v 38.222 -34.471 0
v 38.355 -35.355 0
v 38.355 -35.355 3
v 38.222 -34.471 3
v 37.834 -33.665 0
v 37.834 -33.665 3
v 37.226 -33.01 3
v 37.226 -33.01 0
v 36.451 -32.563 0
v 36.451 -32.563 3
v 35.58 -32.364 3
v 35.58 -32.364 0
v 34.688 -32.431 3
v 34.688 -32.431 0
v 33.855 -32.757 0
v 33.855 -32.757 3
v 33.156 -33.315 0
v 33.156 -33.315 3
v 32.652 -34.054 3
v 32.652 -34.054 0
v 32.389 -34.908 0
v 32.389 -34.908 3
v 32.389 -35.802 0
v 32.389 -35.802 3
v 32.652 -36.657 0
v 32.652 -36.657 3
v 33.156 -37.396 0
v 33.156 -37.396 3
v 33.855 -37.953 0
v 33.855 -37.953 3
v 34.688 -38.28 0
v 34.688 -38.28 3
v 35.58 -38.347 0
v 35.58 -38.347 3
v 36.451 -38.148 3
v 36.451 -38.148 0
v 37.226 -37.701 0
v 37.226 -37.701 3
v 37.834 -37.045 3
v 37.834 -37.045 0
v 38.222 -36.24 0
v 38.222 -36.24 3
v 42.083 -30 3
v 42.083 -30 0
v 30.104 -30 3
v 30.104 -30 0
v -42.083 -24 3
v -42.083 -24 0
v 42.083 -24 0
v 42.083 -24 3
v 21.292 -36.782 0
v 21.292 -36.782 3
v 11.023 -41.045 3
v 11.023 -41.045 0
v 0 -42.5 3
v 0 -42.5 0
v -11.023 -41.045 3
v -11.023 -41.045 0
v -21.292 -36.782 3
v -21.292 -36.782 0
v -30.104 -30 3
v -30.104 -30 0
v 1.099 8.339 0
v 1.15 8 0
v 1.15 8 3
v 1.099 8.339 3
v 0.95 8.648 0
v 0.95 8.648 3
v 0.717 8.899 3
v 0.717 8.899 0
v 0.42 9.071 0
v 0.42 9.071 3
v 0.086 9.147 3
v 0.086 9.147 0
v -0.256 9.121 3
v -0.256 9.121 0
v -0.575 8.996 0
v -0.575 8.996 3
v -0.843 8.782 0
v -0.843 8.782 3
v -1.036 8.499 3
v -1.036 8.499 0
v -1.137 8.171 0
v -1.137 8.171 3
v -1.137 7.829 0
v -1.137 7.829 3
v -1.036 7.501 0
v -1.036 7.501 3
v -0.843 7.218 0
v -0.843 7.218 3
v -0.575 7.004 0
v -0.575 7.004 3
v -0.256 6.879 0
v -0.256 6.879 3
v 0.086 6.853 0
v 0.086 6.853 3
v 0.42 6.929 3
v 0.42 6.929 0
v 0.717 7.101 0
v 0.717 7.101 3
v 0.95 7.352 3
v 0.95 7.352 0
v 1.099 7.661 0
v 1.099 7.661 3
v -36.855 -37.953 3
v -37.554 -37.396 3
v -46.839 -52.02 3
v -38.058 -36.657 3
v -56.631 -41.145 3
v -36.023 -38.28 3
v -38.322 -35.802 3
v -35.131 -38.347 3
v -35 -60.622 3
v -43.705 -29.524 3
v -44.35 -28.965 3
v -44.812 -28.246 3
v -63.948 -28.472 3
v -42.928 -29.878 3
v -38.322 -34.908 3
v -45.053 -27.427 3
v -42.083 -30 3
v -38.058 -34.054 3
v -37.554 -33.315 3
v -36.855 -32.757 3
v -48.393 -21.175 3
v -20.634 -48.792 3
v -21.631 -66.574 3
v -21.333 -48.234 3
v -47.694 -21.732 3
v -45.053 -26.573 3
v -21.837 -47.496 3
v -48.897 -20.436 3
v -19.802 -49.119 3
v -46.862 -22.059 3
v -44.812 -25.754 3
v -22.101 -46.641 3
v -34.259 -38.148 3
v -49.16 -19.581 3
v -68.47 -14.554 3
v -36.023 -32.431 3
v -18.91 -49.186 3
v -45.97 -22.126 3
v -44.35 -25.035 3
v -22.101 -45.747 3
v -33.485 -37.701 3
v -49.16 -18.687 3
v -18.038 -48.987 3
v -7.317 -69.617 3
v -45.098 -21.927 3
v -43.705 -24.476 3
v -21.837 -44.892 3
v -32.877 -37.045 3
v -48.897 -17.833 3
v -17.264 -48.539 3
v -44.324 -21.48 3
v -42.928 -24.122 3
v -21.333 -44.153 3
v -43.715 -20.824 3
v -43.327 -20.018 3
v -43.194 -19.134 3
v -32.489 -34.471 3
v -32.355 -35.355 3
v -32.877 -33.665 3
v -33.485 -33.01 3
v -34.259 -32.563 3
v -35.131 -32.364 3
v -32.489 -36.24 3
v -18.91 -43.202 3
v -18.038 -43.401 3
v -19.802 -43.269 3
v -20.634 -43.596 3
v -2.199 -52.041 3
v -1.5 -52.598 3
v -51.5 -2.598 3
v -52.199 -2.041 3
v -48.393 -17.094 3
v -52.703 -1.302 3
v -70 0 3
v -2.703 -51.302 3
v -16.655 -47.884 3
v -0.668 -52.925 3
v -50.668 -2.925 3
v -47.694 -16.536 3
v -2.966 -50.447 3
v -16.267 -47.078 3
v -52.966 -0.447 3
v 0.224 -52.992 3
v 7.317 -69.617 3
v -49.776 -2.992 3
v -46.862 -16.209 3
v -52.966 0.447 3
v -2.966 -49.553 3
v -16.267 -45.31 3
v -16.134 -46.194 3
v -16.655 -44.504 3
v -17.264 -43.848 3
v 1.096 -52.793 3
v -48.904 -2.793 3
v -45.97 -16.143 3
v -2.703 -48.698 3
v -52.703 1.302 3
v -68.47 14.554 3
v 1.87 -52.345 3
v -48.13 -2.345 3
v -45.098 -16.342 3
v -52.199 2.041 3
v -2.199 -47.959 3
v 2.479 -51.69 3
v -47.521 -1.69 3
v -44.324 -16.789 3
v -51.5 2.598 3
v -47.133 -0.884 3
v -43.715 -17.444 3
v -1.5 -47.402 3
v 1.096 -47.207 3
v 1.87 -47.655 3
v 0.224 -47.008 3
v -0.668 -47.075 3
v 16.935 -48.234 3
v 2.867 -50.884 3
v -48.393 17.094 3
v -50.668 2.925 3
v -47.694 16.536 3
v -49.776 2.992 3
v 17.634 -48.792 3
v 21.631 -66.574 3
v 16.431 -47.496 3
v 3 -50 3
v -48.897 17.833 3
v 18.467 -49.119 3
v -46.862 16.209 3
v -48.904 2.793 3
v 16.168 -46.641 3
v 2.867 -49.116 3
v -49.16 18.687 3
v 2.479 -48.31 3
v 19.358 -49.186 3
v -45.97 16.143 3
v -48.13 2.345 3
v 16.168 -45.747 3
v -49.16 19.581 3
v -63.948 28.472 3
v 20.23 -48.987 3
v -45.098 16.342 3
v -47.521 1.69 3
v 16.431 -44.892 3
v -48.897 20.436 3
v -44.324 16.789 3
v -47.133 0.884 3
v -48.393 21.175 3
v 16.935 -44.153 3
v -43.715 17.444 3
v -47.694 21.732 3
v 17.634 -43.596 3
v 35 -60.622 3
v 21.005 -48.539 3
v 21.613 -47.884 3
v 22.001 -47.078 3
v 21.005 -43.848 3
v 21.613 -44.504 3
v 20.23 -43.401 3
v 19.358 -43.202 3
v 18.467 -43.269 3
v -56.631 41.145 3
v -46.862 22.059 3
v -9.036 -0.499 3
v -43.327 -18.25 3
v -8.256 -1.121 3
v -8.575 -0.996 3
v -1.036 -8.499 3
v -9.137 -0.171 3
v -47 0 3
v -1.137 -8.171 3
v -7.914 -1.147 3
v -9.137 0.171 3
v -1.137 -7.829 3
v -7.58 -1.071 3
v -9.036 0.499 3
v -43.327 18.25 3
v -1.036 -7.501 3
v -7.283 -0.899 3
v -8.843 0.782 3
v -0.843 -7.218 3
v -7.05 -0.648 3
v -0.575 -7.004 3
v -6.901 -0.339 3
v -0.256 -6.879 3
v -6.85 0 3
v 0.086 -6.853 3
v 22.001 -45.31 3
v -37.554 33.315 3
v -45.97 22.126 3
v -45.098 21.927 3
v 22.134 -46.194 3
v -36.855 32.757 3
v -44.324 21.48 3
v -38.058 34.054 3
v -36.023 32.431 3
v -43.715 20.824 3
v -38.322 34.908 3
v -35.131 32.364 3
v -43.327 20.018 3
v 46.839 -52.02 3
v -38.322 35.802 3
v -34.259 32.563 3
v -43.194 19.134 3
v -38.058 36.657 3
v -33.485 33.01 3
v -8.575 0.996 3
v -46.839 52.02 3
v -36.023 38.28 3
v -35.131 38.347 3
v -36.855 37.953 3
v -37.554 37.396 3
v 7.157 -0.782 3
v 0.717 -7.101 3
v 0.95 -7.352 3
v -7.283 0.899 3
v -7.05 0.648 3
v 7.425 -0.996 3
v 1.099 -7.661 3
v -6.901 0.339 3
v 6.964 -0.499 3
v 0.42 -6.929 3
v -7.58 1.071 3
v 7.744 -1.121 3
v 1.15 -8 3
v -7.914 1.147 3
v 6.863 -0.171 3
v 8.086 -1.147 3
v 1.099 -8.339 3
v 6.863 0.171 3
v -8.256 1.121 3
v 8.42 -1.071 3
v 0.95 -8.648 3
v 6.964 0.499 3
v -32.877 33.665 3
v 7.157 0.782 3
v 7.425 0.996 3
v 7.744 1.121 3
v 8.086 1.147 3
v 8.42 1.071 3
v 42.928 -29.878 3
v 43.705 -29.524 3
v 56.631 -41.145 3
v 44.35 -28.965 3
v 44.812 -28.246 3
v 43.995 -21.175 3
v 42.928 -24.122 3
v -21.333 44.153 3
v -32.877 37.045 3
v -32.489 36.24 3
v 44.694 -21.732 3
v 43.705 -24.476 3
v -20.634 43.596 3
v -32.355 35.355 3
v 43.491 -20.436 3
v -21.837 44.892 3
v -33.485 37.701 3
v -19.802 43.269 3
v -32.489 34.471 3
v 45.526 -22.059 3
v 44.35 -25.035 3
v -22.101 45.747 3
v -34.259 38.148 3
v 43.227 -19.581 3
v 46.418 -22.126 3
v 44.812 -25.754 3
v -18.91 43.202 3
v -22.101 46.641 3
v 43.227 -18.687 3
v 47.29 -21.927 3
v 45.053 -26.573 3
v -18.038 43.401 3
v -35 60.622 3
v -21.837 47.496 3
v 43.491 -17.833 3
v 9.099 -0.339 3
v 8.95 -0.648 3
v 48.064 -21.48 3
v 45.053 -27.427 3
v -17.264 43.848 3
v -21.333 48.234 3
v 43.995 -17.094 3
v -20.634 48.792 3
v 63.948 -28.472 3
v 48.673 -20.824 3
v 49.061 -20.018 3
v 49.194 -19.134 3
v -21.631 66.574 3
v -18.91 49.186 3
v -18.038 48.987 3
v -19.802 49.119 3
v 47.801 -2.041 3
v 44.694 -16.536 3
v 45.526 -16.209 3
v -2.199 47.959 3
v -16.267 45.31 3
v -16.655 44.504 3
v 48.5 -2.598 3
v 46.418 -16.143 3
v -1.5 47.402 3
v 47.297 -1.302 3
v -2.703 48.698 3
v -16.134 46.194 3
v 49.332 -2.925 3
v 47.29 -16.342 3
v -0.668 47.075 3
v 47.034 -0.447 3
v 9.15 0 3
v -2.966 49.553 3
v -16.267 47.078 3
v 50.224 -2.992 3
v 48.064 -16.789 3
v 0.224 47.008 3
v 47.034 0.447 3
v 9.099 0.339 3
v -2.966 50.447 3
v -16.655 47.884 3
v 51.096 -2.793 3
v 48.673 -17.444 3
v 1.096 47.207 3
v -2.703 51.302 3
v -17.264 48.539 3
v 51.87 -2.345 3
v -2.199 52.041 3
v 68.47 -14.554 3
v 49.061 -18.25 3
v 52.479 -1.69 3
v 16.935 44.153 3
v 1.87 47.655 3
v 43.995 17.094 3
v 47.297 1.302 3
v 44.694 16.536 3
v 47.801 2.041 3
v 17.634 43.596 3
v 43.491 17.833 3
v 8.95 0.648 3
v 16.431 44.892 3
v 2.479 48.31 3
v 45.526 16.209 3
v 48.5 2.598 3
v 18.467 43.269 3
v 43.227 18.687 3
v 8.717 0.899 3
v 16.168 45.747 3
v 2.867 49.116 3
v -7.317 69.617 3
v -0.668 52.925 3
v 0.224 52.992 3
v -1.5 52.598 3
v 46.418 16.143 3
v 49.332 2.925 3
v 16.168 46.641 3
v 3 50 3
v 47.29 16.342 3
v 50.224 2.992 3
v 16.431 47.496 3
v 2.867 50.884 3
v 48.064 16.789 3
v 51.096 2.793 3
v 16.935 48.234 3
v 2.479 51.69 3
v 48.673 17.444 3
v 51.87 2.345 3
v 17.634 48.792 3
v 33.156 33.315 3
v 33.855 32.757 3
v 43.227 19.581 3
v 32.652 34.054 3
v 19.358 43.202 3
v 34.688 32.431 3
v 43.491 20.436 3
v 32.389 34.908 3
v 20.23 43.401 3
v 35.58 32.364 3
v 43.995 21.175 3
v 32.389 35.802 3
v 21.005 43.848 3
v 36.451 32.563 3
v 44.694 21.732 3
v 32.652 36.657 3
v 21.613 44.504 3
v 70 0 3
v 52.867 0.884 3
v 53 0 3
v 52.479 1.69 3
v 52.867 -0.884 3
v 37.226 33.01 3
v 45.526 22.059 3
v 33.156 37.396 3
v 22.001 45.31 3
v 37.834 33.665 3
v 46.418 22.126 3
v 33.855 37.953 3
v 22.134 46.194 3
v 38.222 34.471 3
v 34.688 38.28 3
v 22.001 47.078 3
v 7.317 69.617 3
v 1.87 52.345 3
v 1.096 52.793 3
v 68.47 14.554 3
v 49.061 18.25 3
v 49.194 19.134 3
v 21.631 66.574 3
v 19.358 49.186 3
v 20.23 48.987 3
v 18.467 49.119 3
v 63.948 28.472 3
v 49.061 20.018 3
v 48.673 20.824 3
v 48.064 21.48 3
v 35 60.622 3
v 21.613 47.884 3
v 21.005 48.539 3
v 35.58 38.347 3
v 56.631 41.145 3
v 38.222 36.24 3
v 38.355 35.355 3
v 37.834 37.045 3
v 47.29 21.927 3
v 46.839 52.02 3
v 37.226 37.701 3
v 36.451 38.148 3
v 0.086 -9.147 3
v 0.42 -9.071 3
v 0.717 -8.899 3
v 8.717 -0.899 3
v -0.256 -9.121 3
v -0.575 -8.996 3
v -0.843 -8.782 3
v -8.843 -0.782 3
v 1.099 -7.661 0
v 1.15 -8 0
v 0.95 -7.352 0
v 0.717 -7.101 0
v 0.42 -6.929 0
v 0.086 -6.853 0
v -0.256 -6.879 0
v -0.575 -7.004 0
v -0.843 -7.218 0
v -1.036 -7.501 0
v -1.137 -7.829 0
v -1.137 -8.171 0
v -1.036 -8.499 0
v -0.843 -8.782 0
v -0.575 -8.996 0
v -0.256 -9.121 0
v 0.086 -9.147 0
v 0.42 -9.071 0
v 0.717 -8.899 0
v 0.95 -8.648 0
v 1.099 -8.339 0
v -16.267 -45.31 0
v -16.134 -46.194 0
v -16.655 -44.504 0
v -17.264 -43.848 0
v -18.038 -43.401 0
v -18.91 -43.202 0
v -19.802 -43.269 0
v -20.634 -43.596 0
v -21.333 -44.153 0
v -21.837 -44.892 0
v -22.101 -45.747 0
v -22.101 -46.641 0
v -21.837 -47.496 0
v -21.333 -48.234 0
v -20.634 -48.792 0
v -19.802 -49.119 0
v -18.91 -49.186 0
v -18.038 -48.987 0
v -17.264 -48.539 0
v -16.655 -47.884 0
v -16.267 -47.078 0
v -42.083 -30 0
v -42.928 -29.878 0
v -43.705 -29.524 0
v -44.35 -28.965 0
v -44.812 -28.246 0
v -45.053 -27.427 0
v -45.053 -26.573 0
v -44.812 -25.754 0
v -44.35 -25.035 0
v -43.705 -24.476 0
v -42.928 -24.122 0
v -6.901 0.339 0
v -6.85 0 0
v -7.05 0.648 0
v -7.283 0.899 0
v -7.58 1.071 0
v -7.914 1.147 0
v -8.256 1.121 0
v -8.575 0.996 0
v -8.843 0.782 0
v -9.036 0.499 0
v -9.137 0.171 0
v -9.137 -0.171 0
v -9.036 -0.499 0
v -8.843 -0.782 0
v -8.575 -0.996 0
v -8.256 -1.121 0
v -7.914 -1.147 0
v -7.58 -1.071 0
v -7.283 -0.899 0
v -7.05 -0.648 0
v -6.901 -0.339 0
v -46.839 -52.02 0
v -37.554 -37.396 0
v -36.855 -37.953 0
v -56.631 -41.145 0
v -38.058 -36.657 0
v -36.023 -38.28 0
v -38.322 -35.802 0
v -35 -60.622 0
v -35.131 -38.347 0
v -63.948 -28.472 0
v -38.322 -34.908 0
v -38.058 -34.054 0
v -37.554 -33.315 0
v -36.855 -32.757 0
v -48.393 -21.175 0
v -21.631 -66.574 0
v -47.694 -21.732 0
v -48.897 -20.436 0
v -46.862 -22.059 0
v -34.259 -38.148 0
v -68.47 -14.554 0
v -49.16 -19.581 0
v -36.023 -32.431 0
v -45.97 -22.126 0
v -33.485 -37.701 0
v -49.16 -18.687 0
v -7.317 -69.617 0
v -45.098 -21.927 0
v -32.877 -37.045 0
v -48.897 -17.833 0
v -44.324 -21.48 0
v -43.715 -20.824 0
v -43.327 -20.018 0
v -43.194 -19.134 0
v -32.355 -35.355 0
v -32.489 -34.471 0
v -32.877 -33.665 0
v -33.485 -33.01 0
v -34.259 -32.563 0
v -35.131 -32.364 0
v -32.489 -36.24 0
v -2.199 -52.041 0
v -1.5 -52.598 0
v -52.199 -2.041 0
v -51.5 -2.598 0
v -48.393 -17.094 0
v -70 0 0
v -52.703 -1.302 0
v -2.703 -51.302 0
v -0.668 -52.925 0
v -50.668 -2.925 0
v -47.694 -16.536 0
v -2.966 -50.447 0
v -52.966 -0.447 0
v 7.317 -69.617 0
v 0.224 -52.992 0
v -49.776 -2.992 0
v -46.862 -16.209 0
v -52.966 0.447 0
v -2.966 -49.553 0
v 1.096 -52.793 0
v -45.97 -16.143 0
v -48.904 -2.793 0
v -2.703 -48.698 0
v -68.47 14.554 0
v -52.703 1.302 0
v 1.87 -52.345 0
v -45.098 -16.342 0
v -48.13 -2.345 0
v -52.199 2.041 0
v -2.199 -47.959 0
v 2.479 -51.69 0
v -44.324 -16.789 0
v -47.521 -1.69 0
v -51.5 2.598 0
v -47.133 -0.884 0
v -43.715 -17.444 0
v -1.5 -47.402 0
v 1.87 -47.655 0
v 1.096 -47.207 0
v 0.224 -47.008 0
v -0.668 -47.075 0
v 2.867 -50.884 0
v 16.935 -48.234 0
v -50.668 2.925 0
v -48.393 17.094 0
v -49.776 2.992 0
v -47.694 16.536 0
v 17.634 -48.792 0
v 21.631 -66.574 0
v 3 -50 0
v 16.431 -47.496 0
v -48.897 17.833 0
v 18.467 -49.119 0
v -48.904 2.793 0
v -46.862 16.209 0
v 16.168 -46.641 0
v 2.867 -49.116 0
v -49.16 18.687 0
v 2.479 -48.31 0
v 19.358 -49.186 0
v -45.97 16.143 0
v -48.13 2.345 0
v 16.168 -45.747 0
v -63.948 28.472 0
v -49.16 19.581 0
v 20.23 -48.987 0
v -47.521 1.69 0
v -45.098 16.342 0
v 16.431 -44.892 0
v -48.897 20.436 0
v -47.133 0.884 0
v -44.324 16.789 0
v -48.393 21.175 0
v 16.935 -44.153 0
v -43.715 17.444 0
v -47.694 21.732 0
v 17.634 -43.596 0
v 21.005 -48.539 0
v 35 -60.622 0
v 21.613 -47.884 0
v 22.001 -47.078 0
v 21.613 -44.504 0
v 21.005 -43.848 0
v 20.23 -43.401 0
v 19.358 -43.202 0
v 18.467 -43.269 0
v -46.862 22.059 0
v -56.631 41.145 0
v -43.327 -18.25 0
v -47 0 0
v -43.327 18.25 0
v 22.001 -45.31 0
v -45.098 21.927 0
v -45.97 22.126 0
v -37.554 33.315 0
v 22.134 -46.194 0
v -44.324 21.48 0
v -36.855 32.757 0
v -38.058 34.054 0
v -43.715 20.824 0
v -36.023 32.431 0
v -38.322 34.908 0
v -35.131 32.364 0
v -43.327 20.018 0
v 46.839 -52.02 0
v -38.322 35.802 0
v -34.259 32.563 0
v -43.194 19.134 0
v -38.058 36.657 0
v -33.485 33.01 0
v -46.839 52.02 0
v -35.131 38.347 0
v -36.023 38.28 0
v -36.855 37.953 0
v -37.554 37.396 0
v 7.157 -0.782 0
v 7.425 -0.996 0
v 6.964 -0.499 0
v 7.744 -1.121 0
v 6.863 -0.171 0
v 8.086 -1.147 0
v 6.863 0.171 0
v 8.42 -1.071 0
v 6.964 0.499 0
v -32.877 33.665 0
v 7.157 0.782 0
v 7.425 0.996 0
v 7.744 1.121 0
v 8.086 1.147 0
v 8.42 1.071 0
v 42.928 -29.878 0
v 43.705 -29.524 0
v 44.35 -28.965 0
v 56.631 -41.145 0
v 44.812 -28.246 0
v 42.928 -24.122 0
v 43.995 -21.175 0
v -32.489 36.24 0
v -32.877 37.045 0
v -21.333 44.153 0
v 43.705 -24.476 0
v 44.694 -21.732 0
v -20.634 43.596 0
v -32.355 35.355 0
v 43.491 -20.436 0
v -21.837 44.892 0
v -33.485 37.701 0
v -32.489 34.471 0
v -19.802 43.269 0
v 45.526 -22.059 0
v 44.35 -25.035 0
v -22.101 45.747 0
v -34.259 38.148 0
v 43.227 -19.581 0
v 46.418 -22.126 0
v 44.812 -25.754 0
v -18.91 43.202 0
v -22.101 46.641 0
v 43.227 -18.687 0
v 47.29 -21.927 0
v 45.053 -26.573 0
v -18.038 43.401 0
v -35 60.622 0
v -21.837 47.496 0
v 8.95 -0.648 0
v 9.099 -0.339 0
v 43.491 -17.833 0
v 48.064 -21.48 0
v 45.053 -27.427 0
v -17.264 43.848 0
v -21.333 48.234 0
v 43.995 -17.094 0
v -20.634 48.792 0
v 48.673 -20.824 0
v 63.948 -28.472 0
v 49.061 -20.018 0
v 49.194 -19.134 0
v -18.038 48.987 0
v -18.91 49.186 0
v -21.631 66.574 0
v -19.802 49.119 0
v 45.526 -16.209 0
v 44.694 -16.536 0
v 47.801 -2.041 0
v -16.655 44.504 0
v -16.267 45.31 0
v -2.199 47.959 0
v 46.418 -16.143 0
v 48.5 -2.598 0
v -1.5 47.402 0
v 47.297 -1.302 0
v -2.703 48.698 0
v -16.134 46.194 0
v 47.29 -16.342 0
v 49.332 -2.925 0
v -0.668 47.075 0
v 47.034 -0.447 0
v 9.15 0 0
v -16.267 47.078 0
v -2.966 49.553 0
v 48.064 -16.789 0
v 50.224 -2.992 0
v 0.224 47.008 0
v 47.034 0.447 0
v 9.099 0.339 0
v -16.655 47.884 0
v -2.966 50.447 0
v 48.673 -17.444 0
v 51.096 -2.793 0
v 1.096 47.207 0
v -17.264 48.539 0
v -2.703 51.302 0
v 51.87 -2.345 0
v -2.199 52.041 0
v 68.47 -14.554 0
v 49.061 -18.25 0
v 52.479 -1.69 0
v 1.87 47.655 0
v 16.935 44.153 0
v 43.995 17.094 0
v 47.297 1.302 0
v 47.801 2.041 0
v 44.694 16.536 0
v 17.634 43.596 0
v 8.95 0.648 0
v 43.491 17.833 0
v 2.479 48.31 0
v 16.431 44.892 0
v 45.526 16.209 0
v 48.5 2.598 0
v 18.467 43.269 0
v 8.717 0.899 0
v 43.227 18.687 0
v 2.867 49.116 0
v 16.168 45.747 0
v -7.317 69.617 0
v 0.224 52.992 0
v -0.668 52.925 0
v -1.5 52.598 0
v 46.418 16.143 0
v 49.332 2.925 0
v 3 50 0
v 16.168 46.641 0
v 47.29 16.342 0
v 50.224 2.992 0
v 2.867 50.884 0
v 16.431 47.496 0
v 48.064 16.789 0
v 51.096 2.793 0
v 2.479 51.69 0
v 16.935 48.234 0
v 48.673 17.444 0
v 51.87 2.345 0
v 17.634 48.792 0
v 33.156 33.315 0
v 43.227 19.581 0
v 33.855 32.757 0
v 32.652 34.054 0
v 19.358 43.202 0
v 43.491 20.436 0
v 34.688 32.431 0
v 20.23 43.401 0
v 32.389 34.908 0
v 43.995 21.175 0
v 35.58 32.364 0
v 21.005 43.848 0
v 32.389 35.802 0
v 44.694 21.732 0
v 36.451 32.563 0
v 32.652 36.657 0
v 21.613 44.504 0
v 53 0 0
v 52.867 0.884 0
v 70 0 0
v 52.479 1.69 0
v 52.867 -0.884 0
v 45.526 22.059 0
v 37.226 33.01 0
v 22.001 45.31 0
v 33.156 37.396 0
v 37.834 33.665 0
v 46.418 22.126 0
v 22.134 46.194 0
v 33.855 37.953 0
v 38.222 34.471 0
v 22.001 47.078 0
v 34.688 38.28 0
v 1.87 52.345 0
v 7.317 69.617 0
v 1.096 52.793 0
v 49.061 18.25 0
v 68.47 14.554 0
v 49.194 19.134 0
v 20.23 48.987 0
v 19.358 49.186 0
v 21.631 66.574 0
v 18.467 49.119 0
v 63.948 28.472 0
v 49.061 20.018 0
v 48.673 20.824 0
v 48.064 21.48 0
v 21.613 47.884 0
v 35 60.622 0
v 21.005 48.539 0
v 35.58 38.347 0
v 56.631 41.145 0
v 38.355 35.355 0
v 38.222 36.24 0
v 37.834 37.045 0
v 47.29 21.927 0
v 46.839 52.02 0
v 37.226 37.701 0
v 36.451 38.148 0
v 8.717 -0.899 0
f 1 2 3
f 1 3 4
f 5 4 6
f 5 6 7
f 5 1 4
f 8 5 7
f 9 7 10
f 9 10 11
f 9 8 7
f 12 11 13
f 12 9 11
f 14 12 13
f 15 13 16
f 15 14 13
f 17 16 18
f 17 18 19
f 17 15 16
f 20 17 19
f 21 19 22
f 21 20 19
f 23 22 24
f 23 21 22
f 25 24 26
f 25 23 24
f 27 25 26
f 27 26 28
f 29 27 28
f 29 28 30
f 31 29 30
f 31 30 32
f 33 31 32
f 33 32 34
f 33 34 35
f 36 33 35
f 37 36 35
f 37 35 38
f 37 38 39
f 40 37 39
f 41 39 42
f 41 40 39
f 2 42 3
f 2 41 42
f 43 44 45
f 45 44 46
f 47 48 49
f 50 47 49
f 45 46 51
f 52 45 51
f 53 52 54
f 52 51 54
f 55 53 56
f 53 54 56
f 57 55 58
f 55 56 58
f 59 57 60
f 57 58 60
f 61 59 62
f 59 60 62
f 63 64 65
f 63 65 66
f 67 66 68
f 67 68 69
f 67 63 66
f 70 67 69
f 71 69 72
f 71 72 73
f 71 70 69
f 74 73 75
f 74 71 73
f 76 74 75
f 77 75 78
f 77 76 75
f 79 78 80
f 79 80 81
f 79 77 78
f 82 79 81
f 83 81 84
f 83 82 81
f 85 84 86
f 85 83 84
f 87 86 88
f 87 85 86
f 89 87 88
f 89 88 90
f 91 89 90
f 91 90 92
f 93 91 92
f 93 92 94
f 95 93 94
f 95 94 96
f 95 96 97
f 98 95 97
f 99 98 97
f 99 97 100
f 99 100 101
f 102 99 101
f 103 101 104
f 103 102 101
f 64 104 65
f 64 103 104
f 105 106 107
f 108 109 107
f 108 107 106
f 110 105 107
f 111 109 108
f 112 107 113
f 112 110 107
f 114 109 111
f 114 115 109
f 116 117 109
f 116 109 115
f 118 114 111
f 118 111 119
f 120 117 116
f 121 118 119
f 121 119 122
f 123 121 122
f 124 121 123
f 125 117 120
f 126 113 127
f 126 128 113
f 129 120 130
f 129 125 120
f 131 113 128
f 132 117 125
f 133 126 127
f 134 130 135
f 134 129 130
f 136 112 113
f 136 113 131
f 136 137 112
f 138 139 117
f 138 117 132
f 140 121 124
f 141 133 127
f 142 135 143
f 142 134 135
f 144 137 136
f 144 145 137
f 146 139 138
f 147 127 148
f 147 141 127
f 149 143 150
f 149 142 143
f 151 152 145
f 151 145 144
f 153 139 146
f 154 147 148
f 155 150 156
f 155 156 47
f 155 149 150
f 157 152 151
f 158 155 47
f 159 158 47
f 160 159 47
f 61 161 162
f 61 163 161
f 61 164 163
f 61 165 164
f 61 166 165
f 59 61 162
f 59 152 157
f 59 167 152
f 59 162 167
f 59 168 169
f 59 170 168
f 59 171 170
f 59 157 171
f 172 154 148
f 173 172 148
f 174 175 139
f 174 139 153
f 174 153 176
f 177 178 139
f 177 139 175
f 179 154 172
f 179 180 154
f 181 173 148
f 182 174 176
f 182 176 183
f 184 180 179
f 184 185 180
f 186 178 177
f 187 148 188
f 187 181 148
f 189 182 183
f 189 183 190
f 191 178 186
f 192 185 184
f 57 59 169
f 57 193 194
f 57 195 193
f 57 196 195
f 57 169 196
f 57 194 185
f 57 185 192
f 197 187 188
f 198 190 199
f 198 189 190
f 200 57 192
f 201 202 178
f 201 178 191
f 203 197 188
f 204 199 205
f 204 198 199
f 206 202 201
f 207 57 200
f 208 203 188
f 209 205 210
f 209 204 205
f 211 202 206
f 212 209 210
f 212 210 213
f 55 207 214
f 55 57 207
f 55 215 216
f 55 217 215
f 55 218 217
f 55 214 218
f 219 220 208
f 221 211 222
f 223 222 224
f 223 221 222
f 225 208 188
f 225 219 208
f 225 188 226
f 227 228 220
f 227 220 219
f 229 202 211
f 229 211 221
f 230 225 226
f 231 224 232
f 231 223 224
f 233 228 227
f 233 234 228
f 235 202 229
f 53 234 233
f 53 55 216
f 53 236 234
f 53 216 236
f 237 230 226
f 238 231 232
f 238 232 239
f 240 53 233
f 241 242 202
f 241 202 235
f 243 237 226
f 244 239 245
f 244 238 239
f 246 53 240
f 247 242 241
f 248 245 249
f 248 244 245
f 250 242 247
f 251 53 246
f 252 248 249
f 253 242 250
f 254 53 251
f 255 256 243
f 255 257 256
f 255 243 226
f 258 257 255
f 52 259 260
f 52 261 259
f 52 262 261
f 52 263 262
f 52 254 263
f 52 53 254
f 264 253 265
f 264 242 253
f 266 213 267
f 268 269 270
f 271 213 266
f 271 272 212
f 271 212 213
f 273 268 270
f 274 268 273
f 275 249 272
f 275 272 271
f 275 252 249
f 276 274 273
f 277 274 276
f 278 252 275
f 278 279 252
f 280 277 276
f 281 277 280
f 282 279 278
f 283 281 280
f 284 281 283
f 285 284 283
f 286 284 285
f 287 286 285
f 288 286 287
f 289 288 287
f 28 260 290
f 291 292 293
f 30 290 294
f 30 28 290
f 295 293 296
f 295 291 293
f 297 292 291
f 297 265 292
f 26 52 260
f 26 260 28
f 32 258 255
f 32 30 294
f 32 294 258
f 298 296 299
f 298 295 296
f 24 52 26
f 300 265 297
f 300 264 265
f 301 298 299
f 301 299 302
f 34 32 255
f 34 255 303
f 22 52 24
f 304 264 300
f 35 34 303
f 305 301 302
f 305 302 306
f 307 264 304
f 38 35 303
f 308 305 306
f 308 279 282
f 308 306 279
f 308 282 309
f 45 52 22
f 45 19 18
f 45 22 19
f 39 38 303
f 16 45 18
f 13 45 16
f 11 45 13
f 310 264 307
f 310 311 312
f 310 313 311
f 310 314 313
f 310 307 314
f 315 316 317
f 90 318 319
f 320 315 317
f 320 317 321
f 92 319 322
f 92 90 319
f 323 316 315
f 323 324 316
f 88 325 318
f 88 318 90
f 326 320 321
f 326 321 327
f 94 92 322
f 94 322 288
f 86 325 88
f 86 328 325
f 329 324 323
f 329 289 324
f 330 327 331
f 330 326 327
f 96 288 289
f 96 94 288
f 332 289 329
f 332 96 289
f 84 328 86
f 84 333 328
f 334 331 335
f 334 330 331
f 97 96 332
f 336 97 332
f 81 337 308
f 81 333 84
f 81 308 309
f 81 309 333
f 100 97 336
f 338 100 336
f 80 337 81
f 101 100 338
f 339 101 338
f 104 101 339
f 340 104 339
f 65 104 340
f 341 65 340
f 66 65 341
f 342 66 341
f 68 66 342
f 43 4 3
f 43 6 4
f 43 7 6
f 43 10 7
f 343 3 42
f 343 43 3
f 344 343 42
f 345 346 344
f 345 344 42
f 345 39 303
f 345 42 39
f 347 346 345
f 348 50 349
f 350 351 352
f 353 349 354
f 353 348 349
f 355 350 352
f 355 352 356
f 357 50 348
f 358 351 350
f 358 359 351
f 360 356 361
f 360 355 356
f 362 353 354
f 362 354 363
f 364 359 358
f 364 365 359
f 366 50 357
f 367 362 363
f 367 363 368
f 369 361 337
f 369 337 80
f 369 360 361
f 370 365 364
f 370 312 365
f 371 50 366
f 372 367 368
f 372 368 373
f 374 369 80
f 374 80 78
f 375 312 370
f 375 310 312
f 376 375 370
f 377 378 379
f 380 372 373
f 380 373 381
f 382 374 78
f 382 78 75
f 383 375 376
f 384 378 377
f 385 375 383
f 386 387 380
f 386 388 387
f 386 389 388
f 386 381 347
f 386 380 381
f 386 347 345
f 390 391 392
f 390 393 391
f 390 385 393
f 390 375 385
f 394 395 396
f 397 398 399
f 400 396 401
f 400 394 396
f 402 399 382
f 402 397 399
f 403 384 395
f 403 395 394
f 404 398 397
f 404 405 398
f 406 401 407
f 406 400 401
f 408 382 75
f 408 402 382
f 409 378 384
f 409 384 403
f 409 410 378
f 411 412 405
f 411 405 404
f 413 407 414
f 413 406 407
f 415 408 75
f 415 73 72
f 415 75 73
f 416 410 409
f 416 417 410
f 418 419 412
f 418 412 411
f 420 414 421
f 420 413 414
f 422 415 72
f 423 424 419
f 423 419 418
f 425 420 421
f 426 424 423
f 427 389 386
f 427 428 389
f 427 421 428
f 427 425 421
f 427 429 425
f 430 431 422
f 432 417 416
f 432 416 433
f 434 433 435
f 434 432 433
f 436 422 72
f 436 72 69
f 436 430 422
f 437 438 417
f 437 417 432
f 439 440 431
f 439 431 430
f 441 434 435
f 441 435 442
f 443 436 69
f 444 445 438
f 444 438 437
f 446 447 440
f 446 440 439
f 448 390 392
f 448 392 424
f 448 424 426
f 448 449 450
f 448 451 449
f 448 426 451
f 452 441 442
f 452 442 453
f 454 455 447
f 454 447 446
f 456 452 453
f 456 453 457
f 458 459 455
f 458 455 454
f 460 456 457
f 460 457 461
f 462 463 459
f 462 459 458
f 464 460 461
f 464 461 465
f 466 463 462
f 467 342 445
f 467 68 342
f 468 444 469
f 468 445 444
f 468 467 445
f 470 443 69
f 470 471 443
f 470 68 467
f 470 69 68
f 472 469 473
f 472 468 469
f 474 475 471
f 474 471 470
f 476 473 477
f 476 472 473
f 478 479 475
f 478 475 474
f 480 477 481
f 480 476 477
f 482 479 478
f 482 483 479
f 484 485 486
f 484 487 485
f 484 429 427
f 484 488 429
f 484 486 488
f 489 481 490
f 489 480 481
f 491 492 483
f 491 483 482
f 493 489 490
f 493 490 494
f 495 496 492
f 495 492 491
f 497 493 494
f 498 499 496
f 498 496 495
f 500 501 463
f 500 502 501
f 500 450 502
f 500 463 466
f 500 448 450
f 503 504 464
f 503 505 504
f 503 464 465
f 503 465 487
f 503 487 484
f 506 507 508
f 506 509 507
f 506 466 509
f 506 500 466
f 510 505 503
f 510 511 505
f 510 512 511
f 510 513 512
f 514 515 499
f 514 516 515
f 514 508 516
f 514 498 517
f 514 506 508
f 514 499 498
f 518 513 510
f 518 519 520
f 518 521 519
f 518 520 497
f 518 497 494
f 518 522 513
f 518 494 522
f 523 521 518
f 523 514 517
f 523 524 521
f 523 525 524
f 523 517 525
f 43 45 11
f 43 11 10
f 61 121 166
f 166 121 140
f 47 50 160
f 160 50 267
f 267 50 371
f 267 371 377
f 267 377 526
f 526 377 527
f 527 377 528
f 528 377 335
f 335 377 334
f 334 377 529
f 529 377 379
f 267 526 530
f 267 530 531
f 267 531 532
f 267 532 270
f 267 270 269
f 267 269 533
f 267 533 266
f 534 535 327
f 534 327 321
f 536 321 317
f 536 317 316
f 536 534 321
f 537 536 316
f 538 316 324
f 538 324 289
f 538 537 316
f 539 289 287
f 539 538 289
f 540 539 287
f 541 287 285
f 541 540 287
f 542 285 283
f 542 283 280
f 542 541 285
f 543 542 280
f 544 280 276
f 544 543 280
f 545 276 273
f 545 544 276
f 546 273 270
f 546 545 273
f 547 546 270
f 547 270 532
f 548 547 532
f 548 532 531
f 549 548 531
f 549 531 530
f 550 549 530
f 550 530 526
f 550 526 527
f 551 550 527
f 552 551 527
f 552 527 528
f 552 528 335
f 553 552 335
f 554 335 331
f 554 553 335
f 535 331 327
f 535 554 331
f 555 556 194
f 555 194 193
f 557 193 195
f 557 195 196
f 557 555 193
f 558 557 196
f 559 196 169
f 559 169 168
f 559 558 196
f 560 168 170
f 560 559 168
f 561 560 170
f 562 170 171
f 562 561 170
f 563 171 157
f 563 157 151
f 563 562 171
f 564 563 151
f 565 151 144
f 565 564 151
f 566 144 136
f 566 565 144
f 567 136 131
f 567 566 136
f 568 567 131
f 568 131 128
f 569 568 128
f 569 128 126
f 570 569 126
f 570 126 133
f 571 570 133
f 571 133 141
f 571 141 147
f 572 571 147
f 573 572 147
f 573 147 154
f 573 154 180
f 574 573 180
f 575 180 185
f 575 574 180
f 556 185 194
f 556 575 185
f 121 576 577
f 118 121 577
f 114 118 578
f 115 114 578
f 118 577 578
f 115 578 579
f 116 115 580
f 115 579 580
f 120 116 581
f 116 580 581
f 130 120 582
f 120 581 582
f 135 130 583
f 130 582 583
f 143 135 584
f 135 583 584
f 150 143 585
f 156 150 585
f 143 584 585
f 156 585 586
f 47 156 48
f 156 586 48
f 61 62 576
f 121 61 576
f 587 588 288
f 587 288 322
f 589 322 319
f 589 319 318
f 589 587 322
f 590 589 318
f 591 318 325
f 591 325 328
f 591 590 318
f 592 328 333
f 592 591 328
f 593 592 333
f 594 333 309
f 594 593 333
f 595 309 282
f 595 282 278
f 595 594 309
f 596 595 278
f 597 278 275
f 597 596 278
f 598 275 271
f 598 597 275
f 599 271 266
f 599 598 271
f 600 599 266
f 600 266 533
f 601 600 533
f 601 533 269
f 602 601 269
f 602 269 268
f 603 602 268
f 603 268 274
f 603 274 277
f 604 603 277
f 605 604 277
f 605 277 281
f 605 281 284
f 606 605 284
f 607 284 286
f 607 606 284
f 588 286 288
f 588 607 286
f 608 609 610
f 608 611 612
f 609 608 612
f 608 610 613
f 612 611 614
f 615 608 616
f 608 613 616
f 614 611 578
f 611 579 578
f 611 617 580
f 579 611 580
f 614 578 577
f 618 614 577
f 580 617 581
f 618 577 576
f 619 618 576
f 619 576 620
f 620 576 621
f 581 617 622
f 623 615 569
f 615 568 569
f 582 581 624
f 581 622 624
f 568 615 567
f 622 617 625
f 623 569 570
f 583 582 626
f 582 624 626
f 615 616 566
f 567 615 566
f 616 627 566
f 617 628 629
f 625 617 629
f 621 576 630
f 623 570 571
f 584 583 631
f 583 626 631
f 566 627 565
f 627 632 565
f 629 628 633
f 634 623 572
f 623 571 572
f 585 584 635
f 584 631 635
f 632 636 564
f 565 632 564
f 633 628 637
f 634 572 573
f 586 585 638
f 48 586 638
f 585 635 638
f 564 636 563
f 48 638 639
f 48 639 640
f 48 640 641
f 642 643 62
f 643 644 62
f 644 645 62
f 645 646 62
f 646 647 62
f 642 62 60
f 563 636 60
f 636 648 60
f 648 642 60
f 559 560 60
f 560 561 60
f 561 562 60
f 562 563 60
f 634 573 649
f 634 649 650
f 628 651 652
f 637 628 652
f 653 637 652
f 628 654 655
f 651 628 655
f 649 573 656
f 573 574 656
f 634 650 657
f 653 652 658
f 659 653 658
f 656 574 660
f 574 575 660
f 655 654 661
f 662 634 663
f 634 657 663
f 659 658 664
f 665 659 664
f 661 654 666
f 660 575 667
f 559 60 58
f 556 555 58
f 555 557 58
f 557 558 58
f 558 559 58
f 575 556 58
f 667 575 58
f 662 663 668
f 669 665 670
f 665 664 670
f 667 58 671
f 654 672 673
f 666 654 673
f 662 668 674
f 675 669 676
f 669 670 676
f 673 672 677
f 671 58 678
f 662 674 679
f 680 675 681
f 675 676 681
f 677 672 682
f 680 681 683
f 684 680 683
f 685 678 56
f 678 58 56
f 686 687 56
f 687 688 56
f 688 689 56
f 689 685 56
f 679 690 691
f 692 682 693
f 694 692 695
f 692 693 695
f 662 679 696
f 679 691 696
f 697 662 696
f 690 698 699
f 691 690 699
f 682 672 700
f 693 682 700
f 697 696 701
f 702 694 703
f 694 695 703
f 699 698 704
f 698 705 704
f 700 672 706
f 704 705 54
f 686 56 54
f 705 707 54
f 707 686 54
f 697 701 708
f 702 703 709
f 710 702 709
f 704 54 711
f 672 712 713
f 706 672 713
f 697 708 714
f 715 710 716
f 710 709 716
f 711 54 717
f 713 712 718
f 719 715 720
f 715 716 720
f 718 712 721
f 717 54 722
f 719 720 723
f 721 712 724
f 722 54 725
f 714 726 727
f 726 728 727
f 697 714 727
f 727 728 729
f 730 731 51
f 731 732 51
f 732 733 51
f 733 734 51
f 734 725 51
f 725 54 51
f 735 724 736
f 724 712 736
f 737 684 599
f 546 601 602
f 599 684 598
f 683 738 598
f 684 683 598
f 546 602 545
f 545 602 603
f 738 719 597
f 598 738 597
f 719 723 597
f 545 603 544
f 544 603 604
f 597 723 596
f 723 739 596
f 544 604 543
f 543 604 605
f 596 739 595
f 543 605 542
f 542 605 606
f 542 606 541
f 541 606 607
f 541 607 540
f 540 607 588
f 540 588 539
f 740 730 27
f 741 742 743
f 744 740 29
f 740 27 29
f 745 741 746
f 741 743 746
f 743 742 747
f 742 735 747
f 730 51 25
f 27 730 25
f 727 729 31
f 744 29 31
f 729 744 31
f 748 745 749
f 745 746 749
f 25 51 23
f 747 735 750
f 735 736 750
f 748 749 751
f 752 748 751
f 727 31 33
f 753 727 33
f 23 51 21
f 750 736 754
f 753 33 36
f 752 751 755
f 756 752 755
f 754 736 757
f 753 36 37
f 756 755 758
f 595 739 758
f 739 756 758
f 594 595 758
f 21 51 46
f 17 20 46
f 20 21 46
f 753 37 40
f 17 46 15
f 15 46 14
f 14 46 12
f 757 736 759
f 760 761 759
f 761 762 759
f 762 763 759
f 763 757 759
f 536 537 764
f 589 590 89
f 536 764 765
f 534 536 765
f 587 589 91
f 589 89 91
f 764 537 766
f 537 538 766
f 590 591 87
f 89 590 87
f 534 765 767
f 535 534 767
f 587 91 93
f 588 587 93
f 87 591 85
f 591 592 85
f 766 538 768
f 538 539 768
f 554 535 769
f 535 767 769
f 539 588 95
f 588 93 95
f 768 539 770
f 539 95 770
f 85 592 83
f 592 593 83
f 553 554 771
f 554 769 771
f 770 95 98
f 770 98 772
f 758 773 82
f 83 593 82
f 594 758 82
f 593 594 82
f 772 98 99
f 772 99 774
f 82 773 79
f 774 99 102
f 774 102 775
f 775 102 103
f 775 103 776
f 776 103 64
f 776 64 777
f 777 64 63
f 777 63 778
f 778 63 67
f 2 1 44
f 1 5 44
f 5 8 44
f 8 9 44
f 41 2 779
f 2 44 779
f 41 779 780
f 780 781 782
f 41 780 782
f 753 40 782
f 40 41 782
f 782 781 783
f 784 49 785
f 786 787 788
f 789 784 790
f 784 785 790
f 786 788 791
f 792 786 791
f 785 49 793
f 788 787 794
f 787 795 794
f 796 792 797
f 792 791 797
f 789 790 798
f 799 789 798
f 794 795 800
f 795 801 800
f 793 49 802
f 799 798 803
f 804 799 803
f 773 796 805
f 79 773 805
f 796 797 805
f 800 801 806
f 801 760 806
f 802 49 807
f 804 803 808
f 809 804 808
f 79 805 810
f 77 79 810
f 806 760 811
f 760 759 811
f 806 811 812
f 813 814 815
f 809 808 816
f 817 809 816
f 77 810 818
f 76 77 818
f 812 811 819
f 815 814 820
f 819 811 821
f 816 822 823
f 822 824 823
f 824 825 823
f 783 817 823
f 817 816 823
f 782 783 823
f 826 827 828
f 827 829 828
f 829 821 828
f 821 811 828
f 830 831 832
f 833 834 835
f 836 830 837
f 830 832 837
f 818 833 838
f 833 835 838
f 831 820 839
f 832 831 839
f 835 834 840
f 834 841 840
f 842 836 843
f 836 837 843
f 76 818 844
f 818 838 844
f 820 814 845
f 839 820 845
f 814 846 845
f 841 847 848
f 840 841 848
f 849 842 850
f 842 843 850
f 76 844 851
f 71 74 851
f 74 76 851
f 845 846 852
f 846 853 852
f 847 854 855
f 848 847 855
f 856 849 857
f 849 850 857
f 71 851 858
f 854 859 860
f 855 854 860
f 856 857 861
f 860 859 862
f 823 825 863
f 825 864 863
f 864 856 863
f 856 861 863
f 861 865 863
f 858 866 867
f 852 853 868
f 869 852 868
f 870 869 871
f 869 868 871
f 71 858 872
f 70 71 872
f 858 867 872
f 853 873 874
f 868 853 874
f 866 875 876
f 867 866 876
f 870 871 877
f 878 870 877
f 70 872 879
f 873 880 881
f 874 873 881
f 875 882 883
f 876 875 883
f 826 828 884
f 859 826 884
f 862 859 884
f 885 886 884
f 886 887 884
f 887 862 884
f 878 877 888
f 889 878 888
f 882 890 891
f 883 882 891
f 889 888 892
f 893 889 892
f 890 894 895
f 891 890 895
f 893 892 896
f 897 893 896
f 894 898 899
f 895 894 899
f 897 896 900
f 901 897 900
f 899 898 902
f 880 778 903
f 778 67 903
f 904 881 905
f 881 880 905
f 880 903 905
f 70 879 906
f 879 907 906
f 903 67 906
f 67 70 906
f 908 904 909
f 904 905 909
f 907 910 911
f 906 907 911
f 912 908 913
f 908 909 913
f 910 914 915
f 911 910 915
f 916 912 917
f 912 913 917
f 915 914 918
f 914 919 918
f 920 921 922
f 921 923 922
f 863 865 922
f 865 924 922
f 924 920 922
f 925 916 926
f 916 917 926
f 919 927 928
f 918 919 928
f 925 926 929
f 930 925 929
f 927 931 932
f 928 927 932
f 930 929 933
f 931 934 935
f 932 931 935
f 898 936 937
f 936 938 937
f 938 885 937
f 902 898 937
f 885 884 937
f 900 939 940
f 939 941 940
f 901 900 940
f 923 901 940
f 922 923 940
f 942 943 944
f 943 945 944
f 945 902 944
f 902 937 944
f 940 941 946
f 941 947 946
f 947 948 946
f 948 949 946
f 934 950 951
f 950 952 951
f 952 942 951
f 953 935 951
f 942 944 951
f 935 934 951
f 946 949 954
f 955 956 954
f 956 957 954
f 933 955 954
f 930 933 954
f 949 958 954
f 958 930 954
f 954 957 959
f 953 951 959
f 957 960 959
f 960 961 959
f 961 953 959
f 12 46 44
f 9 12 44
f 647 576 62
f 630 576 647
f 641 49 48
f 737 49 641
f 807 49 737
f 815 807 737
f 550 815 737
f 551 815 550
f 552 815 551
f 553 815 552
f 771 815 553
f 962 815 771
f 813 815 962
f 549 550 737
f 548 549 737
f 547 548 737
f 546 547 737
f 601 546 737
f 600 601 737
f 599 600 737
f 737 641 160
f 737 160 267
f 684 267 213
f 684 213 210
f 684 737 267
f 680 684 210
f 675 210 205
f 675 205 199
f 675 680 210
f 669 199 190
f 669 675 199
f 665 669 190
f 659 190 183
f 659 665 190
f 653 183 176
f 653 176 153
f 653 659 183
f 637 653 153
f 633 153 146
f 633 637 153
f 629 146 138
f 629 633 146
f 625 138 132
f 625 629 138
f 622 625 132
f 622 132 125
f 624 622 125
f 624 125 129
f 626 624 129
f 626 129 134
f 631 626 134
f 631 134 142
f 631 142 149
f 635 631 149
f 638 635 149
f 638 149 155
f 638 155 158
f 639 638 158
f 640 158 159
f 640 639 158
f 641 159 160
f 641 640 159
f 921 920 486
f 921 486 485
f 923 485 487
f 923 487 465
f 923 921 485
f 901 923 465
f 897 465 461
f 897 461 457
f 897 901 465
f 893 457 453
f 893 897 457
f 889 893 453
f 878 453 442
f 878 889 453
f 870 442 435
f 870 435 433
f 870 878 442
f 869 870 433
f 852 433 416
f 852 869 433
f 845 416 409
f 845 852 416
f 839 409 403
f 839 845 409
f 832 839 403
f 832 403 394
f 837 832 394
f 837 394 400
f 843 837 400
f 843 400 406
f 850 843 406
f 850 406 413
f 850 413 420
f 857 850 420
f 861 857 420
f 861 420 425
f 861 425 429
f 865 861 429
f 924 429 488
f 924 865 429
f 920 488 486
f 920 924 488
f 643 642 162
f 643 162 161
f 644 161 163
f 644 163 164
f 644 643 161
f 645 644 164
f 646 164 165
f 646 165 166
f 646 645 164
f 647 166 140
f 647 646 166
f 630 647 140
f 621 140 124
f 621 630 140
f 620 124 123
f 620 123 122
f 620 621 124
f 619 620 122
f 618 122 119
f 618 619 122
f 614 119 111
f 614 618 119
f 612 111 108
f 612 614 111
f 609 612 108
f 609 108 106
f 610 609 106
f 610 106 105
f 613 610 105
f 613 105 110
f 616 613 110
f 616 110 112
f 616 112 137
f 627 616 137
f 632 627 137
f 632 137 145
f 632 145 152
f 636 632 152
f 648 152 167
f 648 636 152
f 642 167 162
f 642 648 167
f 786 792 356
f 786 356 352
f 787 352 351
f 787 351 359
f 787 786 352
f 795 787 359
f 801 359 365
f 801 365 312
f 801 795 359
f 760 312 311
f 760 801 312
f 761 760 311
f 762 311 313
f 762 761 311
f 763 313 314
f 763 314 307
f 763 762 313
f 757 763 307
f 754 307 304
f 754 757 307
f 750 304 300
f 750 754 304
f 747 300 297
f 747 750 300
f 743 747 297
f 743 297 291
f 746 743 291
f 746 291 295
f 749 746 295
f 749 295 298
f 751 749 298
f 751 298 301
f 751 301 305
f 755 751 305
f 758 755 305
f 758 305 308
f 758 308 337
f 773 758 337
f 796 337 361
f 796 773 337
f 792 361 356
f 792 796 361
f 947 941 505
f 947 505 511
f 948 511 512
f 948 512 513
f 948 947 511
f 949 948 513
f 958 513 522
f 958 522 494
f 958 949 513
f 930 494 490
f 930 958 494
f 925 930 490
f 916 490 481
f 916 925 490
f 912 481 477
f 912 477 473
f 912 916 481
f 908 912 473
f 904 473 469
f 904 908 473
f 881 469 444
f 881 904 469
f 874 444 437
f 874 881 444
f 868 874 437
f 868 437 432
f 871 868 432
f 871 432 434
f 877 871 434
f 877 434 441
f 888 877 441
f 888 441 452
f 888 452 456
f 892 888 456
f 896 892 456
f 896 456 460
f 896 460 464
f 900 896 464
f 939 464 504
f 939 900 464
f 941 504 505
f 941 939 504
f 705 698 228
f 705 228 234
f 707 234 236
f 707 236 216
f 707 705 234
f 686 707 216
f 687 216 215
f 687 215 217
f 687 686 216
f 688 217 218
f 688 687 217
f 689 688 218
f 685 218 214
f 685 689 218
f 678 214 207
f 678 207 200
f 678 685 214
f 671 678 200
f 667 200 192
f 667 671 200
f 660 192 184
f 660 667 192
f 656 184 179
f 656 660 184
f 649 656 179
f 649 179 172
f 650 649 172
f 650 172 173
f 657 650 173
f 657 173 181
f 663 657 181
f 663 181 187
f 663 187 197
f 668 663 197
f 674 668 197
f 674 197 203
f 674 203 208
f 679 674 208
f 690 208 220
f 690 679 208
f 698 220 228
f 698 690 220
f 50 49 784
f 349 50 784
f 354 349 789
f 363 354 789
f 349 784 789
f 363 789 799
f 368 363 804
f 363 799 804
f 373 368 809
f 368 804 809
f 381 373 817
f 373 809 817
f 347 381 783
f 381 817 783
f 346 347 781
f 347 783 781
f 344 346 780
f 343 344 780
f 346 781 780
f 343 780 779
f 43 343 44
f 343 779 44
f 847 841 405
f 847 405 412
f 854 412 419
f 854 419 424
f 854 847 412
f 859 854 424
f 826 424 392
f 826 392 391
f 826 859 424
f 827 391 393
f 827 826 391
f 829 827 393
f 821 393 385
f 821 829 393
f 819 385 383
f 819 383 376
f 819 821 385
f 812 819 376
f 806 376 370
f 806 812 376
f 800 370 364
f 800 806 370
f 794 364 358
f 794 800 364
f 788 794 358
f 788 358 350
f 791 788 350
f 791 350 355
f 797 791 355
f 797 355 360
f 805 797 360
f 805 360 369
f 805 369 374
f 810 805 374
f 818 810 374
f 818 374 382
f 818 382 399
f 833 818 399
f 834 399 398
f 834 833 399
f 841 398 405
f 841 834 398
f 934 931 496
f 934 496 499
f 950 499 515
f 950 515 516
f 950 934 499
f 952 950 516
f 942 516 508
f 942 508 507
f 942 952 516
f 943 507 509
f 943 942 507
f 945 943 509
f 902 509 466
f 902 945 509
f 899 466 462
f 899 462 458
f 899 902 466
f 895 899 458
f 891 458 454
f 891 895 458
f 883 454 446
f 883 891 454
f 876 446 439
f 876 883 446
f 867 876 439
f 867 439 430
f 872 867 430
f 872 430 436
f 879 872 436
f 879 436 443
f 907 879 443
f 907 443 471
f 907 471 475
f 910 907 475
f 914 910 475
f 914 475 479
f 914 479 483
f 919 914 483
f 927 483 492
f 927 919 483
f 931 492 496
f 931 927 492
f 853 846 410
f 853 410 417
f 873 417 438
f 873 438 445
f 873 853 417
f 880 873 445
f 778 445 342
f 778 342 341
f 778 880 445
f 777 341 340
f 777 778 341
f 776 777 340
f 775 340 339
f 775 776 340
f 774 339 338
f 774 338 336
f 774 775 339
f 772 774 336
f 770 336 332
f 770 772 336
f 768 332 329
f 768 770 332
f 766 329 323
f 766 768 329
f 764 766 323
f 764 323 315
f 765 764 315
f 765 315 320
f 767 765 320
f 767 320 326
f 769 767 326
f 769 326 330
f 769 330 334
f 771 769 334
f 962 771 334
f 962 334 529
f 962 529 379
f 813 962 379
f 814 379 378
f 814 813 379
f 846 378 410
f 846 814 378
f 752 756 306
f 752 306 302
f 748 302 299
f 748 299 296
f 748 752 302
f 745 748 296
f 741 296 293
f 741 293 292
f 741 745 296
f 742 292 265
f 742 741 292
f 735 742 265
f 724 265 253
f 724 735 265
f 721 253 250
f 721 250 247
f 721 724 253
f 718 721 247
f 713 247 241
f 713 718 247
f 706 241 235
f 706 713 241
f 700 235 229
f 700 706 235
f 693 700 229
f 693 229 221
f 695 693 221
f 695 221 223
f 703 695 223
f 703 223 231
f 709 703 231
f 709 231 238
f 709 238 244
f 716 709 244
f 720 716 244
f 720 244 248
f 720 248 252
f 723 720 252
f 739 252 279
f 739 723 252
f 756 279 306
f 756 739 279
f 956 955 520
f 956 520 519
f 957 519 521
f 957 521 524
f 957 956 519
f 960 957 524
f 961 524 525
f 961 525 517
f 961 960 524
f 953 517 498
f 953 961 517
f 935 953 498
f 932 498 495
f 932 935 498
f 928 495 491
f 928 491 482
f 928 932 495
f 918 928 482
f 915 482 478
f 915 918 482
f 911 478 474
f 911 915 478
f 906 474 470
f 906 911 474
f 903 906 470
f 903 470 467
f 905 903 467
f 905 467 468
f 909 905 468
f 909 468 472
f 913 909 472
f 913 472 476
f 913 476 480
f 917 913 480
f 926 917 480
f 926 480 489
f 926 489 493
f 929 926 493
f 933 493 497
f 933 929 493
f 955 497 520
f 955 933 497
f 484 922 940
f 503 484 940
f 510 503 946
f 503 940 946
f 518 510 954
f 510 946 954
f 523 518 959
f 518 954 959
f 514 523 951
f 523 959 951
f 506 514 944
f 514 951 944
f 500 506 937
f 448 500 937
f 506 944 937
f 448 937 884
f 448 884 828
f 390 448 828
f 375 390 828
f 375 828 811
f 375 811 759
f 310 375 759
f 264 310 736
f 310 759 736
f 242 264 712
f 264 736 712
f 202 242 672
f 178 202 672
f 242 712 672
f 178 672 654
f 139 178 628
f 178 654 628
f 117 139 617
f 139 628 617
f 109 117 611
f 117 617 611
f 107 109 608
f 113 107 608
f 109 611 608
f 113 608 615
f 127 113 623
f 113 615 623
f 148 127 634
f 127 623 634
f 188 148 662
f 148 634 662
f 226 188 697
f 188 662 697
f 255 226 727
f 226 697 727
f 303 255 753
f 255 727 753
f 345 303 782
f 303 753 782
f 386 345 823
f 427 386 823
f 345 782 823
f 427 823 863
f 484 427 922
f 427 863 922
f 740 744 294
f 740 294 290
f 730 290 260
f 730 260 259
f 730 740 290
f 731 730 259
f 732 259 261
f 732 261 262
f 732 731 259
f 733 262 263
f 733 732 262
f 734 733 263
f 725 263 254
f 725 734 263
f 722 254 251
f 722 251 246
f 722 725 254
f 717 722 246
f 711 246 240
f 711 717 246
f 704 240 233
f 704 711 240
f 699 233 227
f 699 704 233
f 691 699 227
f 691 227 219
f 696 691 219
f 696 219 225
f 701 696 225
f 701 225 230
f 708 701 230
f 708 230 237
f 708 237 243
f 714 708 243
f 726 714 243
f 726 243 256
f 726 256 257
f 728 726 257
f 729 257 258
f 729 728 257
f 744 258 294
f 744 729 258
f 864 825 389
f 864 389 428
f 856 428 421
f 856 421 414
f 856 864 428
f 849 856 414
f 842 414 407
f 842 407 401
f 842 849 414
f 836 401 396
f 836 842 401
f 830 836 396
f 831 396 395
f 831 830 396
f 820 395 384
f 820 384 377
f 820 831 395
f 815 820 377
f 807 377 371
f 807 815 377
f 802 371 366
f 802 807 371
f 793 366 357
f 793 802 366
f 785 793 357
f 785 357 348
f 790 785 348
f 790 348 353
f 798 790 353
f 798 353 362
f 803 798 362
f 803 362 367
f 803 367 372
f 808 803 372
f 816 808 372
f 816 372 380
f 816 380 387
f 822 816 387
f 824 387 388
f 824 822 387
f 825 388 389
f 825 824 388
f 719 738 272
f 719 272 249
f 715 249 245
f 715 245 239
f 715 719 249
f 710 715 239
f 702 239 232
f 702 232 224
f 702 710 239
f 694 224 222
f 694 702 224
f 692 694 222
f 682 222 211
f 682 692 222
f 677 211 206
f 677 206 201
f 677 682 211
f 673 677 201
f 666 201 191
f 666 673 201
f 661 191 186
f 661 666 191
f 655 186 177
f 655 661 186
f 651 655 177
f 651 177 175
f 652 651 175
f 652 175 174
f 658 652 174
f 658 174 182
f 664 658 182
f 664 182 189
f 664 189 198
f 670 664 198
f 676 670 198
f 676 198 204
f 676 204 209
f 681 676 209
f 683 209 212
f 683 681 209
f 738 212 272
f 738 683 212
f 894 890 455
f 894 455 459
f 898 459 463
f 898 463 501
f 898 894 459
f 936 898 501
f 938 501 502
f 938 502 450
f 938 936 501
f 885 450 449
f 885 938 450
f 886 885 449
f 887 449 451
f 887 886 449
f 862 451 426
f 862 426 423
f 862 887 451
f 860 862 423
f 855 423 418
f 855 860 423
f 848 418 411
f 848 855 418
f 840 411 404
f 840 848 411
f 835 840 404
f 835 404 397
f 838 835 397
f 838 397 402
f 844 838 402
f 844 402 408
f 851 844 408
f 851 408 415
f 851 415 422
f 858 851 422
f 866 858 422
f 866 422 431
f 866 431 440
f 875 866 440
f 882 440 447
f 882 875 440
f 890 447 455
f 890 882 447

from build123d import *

# Parameters (mm, degrees)
F0_R     = 70
F0_R_2   = 3
F0_R_3   = 1.15
F1_DEPTH = 3


with BuildPart() as f1:
    # F0 (on Top) → F1 (new body)
    with BuildSketch(Plane.XY):
        Circle(F0_R)
        with Locations((-35.355339, -35.355339)):
            Circle(F0_R_2, mode=Mode.SUBTRACT)
        with Locations((-19.134172, -46.193977)):
            Circle(F0_R_2, mode=Mode.SUBTRACT)
        with Locations((-46.193977, -19.134172)):
            Circle(F0_R_2, mode=Mode.SUBTRACT)
        with Locations((0, -50)):
            Circle(F0_R_2, mode=Mode.SUBTRACT)
        with Locations((19.134172, -46.193977)):
            Circle(F0_R_2, mode=Mode.SUBTRACT)
        with Locations((35.355339, -35.355339)):
            Circle(F0_R_2, mode=Mode.SUBTRACT)
        with BuildLine():
            ThreePointArc((30.103986, -30), (0, -42.5), (-30.103986, -30))
            Line((-30.103986, -30), (-42.083251, -30))
            ThreePointArc((-42.083251, -30), (-45.083251, -27), (-42.083251, -24))
            Line((-42.083251, -24), (-35.07492, -24))
            Line((-35.07492, -24), (35.07492, -24))
            Line((35.07492, -24), (42.083251, -24))
            ThreePointArc((42.083251, -24), (45.083251, -27), (42.083251, -30))
            Line((42.083251, -30), (30.103986, -30))
        make_face(mode=Mode.SUBTRACT)
        with Locations((0, -8)):
            Circle(F0_R_3, mode=Mode.SUBTRACT)
        with Locations((46.193977, -19.134172)):
            Circle(F0_R_2, mode=Mode.SUBTRACT)
        with Locations((-50, 0)):
            Circle(F0_R_2, mode=Mode.SUBTRACT)
        with Locations((-46.193977, 19.134172)):
            Circle(F0_R_2, mode=Mode.SUBTRACT)
        with Locations((-8, 0)):
            Circle(F0_R_3, mode=Mode.SUBTRACT)
        with Locations((-35.355339, 35.355339)):
            Circle(F0_R_2, mode=Mode.SUBTRACT)
        with Locations((-19.134172, 46.193977)):
            Circle(F0_R_2, mode=Mode.SUBTRACT)
        with Locations((8, 0)):
            Circle(F0_R_3, mode=Mode.SUBTRACT)
        with Locations((0, 8)):
            Circle(F0_R_3, mode=Mode.SUBTRACT)
        with Locations((50, 0)):
            Circle(F0_R_2, mode=Mode.SUBTRACT)
        with Locations((46.193977, 19.134172)):
            Circle(F0_R_2, mode=Mode.SUBTRACT)
        with Locations((0, 50)):
            Circle(F0_R_2, mode=Mode.SUBTRACT)
        with Locations((19.134172, 46.193977)):
            Circle(F0_R_2, mode=Mode.SUBTRACT)
        with Locations((35.355339, 35.355339)):
            Circle(F0_R_2, mode=Mode.SUBTRACT)
    extrude(amount=F1_DEPTH)


solid = f1.part
